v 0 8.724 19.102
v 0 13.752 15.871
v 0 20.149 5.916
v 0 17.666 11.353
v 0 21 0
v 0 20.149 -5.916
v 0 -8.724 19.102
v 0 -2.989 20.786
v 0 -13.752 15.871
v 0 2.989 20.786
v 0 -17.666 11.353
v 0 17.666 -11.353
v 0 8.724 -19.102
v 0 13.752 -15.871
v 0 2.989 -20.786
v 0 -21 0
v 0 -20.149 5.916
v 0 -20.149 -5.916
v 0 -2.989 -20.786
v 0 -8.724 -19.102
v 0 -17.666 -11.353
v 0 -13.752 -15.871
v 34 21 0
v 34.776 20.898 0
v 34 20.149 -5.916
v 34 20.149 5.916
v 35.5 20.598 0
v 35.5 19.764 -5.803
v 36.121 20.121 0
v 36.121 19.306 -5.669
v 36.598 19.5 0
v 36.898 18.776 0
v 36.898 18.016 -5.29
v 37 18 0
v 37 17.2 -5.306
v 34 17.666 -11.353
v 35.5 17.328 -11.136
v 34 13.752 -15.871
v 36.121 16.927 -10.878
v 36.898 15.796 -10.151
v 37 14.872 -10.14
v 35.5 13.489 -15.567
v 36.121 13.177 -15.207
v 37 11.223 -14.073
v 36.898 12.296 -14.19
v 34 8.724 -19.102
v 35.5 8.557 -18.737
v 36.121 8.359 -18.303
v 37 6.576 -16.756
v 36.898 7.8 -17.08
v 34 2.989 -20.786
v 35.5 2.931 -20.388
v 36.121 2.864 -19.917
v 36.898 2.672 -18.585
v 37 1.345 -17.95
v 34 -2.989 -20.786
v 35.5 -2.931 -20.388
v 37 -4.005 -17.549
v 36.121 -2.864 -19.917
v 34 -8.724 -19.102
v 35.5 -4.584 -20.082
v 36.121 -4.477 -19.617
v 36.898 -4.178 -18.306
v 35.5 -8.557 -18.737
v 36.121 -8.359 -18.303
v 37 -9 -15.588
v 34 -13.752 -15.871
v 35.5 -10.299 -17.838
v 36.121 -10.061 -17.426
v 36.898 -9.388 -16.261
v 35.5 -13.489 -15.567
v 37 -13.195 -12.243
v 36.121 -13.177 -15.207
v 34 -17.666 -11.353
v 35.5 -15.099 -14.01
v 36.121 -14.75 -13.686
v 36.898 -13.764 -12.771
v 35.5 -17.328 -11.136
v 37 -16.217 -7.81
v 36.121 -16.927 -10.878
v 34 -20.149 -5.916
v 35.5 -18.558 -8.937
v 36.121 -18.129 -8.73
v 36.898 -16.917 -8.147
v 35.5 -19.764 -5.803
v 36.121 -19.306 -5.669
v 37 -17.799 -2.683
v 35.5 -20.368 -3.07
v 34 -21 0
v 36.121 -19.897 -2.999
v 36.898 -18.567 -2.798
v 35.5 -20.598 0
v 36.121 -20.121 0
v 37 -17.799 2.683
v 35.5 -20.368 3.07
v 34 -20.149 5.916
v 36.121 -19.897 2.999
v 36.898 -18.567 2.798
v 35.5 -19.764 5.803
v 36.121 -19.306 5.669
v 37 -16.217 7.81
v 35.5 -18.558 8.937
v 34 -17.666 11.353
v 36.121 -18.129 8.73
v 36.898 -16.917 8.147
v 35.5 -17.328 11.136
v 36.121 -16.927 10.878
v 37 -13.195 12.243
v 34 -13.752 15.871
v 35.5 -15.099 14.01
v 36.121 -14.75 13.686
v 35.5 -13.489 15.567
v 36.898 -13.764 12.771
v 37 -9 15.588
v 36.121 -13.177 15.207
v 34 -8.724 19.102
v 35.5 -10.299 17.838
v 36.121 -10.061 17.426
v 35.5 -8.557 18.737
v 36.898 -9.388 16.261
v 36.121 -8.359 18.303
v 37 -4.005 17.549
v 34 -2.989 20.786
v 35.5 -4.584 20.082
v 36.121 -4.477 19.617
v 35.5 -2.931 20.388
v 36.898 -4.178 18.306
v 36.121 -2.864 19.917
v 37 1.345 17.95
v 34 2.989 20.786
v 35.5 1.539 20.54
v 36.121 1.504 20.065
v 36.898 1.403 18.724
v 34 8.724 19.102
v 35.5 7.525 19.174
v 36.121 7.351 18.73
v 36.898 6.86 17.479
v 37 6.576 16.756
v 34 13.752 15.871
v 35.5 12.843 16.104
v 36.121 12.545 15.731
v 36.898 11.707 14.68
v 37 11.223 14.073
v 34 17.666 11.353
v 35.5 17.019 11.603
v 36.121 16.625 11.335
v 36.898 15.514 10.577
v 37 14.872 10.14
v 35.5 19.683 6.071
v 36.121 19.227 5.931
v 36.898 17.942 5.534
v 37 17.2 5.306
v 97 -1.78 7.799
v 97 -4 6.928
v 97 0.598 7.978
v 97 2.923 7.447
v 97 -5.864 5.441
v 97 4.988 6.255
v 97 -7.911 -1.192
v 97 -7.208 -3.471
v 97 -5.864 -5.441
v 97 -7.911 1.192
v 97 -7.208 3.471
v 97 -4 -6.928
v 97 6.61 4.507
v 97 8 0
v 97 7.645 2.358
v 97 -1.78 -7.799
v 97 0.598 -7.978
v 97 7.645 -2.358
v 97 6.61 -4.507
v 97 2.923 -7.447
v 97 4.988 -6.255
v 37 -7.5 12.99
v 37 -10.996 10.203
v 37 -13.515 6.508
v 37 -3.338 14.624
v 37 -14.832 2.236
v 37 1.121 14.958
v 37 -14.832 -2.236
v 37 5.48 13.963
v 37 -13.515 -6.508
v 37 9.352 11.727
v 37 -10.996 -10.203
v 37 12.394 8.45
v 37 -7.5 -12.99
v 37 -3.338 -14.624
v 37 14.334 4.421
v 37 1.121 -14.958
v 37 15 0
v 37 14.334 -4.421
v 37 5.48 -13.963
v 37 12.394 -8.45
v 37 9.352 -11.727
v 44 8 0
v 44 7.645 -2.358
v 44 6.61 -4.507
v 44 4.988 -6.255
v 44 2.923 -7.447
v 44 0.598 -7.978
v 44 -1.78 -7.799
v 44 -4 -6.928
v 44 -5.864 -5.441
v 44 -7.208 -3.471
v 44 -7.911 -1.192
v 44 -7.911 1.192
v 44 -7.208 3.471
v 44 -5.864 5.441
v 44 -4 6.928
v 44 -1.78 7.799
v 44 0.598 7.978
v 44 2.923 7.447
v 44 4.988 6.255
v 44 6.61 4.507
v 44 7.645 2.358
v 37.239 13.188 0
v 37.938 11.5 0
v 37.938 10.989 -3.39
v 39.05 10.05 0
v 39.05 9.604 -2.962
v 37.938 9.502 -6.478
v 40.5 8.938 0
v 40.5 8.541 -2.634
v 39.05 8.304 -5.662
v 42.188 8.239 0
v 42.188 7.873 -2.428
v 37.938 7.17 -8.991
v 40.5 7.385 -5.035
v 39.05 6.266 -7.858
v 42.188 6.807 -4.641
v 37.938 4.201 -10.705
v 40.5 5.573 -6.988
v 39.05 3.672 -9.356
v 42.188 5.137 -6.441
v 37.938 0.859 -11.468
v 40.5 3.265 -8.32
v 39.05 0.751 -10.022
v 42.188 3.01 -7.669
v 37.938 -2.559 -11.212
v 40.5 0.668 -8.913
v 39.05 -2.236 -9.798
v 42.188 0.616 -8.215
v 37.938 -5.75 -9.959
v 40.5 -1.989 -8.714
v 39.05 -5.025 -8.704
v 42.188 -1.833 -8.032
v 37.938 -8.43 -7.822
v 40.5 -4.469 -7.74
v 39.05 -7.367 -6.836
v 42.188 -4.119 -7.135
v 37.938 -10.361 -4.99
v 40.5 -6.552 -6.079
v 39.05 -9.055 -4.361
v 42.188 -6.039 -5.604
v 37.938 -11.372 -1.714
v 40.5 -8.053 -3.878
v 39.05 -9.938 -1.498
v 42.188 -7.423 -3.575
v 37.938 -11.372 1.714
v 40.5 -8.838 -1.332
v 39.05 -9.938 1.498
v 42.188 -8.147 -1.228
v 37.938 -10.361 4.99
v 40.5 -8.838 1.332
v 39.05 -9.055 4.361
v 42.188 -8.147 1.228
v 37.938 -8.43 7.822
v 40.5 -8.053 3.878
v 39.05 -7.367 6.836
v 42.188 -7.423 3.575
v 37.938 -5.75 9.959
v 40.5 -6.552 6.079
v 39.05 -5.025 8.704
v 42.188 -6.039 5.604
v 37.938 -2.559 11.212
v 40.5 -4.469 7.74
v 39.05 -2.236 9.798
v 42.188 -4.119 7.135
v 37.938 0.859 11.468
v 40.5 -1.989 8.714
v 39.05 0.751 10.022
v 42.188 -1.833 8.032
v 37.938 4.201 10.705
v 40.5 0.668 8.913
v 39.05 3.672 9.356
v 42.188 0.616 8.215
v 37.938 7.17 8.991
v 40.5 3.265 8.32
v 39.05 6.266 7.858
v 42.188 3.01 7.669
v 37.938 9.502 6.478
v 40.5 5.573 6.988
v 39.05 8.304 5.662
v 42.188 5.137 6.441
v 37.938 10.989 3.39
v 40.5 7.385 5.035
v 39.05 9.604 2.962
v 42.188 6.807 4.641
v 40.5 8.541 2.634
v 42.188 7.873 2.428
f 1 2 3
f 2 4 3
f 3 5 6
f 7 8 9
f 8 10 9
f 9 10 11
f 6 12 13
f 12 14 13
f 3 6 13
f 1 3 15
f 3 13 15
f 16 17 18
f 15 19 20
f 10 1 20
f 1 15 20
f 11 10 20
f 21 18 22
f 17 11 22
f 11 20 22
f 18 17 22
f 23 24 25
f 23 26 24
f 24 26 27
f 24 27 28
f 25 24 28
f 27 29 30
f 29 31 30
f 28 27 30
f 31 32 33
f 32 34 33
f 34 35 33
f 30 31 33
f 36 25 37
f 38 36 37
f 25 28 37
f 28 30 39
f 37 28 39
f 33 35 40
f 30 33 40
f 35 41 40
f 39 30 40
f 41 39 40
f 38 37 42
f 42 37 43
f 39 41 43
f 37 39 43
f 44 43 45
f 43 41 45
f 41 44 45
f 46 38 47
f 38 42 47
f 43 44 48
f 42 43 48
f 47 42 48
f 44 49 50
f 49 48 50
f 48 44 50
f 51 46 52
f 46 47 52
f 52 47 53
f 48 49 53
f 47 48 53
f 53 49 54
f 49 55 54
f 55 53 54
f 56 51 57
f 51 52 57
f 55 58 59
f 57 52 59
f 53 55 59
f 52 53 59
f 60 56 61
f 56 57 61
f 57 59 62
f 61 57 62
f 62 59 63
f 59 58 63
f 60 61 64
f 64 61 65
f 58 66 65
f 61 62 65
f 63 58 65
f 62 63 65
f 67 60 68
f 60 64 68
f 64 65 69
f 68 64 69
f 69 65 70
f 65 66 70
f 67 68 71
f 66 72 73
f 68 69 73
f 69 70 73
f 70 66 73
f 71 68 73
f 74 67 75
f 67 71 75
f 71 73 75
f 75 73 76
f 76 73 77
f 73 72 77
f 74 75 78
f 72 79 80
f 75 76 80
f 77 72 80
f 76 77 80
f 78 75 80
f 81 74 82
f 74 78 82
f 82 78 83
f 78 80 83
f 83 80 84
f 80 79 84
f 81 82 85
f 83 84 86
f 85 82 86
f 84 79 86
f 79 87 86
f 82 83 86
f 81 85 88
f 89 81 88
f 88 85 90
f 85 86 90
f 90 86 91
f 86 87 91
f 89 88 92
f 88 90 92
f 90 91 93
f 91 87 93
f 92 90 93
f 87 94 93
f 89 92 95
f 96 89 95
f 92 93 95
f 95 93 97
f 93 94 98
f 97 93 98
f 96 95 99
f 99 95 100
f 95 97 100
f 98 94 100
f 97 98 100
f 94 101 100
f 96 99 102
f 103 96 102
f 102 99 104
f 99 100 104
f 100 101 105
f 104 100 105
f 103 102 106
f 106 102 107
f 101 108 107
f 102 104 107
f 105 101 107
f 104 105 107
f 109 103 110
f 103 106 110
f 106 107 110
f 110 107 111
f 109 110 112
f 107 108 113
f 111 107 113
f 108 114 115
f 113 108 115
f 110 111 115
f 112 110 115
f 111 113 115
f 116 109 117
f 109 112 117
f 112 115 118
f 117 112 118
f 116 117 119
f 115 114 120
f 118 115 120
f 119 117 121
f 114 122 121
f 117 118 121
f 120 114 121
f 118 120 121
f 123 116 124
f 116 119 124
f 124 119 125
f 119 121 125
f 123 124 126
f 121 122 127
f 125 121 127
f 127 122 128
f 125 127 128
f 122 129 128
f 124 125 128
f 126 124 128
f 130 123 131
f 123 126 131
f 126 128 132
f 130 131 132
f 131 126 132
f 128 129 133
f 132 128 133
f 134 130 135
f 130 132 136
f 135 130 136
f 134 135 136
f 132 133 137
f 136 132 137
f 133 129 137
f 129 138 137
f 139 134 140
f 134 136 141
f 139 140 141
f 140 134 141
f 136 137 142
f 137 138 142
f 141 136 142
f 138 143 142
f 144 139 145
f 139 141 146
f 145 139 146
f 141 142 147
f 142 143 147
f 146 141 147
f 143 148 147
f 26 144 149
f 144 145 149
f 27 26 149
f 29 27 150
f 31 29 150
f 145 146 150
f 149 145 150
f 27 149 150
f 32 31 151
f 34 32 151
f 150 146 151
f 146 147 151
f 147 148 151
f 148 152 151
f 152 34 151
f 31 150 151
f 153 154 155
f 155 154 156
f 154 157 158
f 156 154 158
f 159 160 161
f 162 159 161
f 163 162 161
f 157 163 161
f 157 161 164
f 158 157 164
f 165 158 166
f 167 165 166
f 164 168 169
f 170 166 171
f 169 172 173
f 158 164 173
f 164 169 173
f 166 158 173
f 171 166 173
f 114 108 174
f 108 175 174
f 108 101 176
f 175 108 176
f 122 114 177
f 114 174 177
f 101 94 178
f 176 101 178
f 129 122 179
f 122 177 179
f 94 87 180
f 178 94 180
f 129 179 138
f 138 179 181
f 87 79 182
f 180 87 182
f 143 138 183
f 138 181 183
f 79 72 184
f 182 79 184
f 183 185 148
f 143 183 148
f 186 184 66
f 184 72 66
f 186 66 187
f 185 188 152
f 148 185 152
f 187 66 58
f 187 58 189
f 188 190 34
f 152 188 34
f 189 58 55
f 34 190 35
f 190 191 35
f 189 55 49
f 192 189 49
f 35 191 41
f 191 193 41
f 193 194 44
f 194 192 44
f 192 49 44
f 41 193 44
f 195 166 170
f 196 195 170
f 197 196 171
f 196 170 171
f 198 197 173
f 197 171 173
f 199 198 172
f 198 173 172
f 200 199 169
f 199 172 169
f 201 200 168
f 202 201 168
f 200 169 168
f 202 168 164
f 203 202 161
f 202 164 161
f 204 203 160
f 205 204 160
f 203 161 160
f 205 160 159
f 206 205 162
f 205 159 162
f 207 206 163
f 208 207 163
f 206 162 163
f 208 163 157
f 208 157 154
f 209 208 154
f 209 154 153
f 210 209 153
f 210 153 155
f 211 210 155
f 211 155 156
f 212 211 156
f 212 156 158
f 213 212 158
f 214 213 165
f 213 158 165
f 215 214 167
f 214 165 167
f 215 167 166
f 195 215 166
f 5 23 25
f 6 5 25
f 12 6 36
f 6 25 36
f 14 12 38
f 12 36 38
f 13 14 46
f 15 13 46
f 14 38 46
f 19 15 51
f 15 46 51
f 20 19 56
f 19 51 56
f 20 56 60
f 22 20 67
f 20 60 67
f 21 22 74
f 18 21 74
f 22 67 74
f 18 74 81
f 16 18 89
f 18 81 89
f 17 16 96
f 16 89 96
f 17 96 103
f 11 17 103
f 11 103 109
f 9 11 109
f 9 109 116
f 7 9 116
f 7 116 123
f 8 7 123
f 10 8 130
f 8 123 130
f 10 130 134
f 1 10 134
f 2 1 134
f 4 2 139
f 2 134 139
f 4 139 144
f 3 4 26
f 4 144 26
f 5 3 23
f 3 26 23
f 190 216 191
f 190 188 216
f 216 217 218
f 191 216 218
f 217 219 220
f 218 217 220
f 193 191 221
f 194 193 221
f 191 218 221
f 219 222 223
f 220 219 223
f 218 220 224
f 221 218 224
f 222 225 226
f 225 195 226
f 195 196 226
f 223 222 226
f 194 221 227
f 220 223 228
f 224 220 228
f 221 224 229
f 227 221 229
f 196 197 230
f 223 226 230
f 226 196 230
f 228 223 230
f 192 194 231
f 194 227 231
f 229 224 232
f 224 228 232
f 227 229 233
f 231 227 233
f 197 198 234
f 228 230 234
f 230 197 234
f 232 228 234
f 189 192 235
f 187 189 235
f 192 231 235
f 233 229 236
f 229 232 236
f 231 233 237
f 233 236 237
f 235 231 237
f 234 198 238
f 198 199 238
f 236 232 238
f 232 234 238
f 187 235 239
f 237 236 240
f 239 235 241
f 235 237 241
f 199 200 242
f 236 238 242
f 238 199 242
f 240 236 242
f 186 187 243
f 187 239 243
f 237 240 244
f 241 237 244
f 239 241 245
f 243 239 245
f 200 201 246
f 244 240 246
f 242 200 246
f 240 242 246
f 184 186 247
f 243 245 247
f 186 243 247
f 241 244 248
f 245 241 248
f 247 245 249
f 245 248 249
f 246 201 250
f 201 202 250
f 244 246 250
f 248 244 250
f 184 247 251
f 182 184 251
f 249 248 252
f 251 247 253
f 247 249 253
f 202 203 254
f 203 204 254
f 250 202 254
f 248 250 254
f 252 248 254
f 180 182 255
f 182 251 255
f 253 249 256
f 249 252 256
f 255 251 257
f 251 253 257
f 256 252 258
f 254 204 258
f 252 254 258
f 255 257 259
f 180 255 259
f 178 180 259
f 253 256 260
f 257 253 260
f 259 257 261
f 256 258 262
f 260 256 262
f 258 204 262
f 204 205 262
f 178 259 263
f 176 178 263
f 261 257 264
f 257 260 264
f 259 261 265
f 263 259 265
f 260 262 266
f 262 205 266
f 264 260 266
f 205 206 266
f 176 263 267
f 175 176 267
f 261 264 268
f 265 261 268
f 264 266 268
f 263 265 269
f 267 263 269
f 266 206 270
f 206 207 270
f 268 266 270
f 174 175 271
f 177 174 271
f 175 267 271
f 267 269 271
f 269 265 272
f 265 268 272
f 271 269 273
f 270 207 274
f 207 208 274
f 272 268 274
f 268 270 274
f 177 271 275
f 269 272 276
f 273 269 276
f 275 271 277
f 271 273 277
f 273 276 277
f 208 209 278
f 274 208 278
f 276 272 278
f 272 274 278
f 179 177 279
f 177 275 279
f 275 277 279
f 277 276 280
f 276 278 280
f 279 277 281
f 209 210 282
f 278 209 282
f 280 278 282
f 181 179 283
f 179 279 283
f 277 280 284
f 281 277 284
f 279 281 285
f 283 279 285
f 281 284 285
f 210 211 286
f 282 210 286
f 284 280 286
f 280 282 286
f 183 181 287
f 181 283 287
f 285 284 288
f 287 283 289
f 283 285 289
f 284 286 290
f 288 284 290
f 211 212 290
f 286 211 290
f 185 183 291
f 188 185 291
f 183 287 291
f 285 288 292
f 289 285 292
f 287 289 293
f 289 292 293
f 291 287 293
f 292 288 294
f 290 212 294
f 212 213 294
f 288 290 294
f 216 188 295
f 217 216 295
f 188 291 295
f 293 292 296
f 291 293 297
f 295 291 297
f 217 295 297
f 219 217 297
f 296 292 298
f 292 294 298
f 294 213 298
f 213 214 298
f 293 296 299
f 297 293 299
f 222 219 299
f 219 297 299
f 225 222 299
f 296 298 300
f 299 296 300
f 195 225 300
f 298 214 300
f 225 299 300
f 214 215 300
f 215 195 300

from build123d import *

# Parameters (mm, degrees)
FILLET1_R = 3
FILLET2_R = 7


with BuildPart() as part:
    # Sketch1 → Revolve1 (revolve)
    with BuildSketch(Plane.XY):
        Polygon((0, 0), (0, 21), (37, 21), (37, 8), (97, 8), (97, 0), align=None)
    revolve(axis=Axis((97, 0, 0), (-1, 0, 0)))

    # Fillet1
    fillet1_edges = [part.edges().sort_by_distance(p)[0] for p in [
        (37, -21, 0),
    ]]
    fillet(fillet1_edges, radius=FILLET1_R)

    # Fillet2
    fillet2_edges = [part.edges().sort_by_distance(p)[0] for p in [
        (37, -8, 0),
    ]]
    fillet(fillet2_edges, radius=FILLET2_R)


solid = part.part
